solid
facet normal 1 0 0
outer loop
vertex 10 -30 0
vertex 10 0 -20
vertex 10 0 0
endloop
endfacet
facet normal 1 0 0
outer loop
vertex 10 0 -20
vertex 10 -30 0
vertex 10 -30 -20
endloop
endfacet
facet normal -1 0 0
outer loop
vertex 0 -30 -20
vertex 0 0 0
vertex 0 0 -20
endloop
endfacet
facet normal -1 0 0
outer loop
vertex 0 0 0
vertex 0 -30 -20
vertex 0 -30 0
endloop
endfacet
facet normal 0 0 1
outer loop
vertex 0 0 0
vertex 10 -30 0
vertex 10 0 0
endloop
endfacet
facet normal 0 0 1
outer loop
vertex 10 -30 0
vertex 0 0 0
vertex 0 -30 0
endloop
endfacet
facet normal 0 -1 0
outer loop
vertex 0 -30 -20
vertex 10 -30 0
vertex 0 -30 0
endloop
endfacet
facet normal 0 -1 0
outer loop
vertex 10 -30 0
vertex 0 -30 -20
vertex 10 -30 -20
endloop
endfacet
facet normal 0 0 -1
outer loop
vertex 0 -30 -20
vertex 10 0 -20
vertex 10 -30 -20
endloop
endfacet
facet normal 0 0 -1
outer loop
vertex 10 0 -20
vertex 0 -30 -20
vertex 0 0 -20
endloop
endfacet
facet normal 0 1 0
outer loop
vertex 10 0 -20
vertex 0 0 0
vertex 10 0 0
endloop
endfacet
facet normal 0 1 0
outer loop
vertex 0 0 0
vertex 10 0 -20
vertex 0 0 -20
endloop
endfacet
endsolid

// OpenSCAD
rotate([-90, 0, -90]) cube([30, 20, 10]);
%cube([30, 20, 10]);
